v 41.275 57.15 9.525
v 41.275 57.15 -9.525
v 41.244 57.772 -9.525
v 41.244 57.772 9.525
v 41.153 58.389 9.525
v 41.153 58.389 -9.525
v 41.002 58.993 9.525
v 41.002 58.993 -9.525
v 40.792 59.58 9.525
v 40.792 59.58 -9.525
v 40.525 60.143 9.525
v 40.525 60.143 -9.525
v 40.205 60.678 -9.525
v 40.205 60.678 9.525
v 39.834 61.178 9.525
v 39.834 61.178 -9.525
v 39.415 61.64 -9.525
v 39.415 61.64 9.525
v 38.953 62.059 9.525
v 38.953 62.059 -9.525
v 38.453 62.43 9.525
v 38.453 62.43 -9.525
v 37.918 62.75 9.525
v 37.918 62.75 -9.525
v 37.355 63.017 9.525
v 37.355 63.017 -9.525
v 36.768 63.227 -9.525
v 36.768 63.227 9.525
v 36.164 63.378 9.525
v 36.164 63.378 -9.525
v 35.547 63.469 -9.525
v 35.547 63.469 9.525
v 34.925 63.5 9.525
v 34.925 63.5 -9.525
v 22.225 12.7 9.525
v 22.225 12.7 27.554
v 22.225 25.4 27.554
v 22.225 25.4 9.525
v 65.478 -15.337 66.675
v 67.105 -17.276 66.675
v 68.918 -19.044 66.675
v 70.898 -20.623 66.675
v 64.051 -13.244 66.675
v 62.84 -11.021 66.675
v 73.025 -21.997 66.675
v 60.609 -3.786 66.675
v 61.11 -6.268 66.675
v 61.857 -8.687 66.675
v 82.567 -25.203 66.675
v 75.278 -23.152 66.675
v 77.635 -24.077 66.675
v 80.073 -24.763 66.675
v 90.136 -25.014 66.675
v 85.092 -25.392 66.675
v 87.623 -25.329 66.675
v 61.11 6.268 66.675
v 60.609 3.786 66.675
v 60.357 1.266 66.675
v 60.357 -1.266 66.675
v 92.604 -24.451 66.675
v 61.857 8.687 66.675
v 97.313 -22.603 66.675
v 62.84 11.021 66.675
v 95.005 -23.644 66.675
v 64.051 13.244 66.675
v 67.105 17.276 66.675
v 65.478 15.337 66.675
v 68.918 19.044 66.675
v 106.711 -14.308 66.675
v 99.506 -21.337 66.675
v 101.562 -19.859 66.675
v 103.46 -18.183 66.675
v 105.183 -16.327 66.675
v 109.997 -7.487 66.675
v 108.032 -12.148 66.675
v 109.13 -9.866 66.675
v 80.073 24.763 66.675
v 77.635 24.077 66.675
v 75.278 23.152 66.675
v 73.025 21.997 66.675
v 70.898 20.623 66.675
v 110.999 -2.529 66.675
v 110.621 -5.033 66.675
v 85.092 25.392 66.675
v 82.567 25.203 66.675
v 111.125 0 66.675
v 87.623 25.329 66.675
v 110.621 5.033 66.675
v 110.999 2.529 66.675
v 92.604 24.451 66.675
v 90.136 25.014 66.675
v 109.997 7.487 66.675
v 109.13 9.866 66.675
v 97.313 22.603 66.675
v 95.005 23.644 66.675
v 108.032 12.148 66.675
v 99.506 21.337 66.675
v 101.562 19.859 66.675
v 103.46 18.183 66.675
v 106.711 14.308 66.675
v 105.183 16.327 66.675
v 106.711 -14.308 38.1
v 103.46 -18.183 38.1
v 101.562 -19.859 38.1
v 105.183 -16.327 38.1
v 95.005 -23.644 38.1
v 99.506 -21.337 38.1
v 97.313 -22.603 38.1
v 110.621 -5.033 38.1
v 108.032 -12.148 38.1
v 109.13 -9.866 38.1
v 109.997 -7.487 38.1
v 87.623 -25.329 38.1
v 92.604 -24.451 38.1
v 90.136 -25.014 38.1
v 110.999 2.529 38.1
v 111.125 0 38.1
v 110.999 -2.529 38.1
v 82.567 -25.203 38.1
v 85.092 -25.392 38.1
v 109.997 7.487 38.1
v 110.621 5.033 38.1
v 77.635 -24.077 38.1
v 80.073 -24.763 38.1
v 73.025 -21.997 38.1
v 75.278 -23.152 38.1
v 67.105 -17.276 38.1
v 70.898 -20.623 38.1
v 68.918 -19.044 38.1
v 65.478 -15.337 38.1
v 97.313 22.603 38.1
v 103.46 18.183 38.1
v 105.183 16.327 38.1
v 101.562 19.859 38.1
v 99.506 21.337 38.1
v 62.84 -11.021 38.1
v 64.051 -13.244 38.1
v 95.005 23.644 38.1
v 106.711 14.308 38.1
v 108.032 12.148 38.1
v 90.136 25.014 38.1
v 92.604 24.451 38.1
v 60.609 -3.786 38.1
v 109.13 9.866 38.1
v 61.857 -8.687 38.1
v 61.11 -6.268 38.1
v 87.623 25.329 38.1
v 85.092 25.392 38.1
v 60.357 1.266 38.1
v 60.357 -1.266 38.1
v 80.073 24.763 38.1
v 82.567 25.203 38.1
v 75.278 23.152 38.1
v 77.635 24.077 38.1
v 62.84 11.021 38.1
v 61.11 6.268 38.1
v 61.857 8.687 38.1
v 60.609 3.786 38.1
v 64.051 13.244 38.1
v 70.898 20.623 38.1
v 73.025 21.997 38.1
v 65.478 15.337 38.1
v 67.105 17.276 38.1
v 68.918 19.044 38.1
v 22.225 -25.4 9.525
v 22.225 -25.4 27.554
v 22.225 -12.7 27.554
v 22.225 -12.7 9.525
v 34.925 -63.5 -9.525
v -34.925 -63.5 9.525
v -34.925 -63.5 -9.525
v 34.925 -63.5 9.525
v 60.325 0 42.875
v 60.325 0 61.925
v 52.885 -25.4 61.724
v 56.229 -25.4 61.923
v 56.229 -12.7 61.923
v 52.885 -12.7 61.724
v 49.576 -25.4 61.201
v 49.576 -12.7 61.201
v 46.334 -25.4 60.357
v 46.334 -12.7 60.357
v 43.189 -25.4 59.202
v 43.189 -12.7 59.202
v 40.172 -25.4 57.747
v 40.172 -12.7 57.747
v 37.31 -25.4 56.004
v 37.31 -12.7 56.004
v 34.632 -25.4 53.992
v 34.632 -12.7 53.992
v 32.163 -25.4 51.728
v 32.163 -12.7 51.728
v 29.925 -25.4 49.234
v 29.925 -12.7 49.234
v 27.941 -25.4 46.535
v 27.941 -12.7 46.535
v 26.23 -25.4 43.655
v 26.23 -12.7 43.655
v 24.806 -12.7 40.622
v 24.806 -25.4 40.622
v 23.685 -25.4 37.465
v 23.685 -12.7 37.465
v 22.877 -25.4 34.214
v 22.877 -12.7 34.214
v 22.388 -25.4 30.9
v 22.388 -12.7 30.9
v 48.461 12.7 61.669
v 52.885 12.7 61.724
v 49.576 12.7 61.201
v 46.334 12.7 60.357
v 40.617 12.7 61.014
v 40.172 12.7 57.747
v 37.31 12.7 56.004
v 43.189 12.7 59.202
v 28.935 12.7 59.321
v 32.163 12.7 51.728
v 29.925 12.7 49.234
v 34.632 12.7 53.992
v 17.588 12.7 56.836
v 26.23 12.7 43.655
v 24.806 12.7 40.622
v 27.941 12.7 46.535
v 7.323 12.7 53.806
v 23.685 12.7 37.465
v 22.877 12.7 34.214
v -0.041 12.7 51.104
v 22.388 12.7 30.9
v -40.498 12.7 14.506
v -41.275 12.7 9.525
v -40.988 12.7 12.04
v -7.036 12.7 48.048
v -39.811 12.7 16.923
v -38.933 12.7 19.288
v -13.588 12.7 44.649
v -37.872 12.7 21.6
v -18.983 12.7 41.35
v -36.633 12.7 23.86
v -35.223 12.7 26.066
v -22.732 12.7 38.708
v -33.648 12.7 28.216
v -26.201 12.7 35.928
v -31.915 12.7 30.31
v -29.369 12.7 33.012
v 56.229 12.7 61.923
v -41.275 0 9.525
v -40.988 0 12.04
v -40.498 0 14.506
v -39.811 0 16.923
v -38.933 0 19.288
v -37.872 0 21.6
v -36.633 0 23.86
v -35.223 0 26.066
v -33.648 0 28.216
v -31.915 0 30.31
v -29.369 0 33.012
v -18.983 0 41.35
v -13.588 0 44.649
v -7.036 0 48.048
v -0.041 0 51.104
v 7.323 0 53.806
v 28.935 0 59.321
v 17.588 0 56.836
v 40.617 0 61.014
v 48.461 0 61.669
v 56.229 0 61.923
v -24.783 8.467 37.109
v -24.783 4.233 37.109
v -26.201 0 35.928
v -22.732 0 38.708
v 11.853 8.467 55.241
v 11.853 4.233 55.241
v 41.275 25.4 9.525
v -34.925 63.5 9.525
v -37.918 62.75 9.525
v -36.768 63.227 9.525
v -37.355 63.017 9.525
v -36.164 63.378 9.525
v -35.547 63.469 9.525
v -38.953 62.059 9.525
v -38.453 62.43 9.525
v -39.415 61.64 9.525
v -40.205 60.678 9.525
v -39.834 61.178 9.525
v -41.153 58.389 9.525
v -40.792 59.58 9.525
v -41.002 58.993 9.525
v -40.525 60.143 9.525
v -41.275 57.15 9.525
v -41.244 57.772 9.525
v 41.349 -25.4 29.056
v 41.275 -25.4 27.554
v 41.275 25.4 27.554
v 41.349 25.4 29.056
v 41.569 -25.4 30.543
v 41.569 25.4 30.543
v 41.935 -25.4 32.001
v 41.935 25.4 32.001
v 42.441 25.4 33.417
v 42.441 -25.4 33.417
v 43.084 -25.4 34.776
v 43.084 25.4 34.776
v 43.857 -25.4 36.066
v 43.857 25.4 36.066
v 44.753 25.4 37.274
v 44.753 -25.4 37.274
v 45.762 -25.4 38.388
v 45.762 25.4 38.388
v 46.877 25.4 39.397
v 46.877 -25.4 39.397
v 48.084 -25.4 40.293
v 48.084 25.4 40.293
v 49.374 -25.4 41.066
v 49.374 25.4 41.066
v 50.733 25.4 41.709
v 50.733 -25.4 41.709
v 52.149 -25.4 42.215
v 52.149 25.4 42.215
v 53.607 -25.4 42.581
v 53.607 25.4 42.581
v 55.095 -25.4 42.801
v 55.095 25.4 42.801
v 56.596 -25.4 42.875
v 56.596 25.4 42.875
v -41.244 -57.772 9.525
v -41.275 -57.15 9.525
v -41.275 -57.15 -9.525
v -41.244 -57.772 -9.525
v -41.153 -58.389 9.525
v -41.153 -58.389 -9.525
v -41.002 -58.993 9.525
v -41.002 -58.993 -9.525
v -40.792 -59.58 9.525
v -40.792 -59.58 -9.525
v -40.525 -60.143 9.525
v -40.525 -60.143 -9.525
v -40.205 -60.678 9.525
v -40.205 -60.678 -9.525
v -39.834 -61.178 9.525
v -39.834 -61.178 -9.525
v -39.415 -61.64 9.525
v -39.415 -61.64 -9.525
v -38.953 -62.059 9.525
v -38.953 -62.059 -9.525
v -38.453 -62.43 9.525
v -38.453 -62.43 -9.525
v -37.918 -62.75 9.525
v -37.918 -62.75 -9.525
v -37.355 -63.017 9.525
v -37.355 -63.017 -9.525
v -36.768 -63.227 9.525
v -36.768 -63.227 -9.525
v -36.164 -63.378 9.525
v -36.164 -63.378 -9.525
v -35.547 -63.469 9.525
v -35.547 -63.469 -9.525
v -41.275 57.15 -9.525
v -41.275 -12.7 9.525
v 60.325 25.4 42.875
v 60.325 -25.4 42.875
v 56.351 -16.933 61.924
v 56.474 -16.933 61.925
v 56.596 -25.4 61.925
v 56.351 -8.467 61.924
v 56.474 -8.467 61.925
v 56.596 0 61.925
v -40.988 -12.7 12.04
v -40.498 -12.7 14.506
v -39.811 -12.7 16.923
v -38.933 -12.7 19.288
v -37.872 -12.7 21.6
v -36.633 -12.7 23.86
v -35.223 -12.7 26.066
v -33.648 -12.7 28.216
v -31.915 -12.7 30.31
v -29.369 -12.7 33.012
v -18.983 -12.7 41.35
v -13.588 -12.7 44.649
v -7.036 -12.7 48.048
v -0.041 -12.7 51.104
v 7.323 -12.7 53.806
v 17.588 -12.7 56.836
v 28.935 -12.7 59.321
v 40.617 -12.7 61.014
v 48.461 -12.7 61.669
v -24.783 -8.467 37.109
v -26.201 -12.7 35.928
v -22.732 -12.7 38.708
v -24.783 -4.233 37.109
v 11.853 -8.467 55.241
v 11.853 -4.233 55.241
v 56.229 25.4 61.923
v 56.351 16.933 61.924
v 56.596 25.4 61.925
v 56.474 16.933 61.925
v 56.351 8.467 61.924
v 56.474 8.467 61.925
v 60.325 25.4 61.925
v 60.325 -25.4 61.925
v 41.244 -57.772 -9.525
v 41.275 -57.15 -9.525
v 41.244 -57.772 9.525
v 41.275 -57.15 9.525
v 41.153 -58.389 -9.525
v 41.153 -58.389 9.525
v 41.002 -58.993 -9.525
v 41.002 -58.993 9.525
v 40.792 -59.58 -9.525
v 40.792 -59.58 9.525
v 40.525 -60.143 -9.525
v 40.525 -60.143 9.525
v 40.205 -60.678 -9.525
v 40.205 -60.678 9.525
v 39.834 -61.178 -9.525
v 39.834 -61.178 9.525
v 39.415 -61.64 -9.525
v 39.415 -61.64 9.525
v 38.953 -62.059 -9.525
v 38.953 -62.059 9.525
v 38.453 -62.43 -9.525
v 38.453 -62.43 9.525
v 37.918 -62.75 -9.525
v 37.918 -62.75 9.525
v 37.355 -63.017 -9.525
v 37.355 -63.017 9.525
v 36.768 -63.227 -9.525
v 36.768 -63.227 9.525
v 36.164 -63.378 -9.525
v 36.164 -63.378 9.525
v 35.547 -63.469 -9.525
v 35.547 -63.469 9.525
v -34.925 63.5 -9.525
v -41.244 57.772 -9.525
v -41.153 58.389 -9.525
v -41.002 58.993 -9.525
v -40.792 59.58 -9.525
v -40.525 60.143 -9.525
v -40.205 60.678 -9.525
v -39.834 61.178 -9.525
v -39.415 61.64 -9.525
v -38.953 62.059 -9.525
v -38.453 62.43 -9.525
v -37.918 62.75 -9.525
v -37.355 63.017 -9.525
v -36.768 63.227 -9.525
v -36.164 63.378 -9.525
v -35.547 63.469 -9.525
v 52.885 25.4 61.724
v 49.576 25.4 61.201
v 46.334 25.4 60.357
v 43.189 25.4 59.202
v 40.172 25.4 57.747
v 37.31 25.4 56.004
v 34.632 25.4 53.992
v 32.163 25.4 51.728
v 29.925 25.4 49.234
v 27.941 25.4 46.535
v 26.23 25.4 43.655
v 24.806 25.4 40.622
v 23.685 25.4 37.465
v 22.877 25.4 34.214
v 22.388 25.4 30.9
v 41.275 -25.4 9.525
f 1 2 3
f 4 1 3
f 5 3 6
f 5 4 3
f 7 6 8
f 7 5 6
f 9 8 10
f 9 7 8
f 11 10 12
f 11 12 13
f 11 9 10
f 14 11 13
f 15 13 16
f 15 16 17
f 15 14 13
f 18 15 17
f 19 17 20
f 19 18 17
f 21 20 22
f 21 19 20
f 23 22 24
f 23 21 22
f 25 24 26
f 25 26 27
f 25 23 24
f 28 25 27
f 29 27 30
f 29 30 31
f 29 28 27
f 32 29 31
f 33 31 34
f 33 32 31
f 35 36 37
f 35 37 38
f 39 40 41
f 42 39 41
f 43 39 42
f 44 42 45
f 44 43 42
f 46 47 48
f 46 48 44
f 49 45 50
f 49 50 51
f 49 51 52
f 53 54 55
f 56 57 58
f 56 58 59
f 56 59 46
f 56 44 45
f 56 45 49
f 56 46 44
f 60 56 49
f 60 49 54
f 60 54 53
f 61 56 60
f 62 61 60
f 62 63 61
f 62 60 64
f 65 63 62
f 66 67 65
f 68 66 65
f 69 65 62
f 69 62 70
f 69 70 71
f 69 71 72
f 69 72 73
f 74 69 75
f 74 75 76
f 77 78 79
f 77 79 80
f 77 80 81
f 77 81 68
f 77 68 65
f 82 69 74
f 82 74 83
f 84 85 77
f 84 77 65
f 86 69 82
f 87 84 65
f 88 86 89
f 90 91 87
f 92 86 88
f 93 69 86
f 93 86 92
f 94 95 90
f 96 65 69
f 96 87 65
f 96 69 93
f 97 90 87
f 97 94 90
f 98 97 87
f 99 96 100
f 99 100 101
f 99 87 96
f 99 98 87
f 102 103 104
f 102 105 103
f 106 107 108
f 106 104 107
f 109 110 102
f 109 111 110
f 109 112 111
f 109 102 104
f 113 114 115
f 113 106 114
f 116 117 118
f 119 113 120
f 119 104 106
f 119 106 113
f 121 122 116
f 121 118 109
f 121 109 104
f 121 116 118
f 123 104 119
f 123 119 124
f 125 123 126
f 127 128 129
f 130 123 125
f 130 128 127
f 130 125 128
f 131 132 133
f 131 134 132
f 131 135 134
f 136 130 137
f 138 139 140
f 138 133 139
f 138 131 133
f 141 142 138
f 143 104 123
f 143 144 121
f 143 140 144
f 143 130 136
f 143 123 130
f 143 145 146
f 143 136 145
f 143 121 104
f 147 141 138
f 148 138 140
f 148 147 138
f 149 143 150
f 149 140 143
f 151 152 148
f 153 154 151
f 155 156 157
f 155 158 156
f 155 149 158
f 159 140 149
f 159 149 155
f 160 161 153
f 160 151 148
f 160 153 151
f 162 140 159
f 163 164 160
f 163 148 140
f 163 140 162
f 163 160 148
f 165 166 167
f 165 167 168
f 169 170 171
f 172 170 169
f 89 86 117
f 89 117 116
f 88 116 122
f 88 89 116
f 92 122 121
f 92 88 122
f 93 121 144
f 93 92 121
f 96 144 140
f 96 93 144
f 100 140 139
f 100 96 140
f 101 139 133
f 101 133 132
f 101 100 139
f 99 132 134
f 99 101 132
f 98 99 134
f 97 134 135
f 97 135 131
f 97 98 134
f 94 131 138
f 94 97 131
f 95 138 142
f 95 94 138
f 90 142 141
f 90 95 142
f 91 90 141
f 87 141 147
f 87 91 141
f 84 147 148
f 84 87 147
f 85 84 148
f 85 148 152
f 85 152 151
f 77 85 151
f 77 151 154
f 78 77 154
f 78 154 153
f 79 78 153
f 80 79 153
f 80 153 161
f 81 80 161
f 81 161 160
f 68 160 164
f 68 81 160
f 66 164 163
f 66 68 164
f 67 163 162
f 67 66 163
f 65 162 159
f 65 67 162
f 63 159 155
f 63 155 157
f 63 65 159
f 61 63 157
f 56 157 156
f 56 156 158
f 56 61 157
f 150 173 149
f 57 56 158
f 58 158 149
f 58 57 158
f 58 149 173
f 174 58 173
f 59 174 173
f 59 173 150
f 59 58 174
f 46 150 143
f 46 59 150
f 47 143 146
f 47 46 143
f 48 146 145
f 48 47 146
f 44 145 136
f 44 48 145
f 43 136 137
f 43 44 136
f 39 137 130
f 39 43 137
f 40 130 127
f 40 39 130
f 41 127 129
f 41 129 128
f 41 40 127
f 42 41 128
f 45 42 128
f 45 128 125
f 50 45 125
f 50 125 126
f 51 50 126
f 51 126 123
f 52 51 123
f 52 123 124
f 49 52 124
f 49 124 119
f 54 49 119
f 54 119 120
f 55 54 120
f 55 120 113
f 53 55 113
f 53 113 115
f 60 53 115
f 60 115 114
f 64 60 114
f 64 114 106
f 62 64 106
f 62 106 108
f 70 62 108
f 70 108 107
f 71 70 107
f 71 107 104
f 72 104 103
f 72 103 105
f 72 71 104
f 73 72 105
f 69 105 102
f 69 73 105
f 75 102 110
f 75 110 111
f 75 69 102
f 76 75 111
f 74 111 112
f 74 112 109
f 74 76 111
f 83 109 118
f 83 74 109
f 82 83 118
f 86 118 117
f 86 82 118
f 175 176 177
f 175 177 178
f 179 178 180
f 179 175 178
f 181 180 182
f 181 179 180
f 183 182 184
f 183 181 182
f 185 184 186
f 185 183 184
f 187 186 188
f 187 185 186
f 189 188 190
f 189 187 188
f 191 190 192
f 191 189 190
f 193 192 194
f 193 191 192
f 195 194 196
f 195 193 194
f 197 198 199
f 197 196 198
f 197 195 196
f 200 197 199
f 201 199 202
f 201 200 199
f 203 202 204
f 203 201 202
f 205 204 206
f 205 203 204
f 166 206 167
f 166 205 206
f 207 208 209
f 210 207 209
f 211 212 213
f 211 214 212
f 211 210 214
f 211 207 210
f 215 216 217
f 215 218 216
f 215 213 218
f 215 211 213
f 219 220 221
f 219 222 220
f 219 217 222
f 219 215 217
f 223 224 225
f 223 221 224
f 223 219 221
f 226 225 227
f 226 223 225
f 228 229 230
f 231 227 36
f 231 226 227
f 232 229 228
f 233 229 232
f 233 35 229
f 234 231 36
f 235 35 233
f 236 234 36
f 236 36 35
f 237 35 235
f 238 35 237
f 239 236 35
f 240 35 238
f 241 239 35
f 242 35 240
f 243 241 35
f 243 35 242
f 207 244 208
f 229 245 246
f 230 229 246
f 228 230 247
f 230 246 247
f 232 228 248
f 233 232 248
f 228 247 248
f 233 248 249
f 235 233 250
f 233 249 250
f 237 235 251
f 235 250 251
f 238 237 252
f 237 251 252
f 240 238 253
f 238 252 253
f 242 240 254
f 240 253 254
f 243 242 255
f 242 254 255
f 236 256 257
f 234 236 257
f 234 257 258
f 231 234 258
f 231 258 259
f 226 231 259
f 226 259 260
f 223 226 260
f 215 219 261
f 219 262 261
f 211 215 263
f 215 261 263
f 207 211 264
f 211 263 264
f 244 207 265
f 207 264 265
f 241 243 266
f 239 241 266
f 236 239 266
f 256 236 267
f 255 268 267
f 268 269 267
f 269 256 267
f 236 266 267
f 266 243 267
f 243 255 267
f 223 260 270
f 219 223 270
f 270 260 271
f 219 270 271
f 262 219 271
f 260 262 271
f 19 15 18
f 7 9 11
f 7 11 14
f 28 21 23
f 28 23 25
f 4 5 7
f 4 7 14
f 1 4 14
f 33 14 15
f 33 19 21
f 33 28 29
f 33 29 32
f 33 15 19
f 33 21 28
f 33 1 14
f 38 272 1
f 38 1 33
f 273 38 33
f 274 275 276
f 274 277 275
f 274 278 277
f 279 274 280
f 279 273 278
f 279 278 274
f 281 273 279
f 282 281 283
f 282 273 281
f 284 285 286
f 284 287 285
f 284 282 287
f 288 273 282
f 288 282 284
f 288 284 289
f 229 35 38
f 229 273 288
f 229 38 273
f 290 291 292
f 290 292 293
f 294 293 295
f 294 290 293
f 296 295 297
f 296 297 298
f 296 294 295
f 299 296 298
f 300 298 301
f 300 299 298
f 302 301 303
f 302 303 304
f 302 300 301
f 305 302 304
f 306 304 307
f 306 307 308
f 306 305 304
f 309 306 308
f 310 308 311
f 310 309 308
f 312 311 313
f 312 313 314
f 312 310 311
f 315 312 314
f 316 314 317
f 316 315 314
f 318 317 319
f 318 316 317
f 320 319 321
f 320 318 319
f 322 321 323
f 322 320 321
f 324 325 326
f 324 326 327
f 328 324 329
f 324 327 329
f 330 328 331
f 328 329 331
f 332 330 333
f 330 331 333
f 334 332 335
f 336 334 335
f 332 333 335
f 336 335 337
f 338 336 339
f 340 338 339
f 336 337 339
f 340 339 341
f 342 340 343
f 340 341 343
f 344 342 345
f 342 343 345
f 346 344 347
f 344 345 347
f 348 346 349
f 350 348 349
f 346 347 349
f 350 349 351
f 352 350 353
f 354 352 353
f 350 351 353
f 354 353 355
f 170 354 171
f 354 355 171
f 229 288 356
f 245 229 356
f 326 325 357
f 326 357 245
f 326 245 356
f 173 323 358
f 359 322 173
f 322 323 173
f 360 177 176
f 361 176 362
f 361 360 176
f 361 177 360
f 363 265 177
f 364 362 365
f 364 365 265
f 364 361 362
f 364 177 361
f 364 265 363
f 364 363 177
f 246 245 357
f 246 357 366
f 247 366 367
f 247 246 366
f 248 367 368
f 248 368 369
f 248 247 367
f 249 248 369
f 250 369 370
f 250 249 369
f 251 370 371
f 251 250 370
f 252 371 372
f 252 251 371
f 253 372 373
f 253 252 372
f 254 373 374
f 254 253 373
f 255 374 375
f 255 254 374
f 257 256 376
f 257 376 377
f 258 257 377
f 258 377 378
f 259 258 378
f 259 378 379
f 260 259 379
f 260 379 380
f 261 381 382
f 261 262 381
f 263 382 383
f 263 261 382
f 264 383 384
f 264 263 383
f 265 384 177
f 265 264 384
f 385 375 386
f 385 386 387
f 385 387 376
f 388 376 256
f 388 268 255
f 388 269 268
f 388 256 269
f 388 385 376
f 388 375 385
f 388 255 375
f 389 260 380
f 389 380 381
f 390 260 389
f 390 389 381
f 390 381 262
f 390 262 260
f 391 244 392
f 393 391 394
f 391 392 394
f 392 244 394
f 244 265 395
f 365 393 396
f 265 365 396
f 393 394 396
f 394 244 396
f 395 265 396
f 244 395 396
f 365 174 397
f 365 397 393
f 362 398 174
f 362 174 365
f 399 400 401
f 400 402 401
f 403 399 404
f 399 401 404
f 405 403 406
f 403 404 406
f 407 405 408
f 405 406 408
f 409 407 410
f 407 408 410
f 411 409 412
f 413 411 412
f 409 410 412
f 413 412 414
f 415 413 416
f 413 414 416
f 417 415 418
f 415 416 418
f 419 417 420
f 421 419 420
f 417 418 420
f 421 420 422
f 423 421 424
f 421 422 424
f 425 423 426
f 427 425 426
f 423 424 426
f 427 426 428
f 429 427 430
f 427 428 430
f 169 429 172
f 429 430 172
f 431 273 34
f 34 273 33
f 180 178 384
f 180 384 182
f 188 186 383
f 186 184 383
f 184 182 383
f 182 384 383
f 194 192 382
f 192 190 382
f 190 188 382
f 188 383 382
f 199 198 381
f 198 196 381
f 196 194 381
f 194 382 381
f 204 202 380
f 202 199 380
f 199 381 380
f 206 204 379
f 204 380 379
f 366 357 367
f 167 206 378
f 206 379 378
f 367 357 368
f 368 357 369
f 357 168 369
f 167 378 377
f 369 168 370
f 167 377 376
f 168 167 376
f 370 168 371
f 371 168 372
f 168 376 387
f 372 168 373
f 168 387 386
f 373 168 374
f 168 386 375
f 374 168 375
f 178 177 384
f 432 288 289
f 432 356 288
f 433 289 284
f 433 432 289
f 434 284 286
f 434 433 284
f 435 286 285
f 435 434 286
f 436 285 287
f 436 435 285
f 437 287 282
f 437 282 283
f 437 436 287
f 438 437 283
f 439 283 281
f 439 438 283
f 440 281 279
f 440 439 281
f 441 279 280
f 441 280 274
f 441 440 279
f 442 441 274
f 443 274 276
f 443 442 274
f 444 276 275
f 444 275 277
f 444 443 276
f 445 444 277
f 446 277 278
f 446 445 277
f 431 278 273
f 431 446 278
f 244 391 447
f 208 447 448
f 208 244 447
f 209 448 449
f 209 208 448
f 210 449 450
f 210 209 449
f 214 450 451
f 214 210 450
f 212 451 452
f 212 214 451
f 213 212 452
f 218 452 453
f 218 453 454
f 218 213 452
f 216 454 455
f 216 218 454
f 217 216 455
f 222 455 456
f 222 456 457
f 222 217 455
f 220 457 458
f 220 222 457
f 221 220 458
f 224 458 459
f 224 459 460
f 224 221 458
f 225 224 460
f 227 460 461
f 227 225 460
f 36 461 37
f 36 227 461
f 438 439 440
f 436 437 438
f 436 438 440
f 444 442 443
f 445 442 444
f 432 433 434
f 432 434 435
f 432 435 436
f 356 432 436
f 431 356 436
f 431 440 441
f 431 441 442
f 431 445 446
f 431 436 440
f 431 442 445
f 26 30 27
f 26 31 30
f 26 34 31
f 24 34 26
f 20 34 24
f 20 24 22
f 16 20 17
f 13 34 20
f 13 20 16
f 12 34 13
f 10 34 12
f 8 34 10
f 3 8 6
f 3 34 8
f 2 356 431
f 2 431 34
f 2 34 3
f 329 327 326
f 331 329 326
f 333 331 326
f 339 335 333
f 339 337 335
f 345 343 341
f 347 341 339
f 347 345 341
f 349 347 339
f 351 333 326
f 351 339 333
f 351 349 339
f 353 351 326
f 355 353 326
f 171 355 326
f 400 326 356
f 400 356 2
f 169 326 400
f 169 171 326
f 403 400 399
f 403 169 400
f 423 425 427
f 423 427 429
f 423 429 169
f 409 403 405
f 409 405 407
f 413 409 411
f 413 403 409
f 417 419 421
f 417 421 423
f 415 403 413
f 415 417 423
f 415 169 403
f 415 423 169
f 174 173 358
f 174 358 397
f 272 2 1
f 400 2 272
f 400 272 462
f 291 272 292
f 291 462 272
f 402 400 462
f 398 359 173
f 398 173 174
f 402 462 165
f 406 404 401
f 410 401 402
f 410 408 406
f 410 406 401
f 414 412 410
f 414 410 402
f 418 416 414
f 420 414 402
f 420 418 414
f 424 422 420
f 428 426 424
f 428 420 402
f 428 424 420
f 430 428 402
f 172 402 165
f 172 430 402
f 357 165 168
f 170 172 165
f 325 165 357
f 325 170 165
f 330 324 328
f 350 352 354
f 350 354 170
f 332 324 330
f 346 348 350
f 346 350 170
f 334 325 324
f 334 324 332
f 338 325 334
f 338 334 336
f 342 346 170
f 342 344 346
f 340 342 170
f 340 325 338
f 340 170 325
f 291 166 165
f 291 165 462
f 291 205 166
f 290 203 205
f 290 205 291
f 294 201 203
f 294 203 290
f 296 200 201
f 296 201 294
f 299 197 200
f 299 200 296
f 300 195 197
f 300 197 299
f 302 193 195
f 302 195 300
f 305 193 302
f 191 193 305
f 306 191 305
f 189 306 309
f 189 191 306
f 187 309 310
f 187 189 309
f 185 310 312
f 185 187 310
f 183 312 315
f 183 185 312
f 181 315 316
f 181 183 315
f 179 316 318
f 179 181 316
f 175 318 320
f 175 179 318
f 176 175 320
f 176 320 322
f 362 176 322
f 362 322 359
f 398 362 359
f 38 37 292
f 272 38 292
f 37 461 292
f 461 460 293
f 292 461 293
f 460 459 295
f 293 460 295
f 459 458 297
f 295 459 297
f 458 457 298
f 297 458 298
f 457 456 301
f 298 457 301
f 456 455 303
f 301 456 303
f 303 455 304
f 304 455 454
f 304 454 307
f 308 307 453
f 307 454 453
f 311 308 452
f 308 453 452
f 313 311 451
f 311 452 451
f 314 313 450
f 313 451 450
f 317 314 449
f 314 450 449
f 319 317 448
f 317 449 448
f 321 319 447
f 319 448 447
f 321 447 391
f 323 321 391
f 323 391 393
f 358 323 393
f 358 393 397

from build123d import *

# Parameters (mm, degrees)
F1_DEPTH = 63.5
F2_DEPTH = 25.4
F3_DEPTH = 12.7
F5_R     = 6.35


with BuildPart() as f1:
    # F0 (on Front) → F1 (new body, symmetric)
    with BuildSketch(Plane.XZ):
        Polygon((22.225, 9.525), (-41.275, 9.525), (-41.275, -9.525), (41.275, -9.525), (41.275, 9.525), align=None)
    extrude(amount=F1_DEPTH, both=True)

    # F0 (on Front) → F2 (join, symmetric)
    with BuildSketch(Plane.XZ):
        with BuildLine():
            Line((22.225, 27.55392), (22.225, 9.525))
            Line((22.225, 9.525), (41.275, 9.525))
            Line((41.275, 9.525), (41.275, 27.55392))
            ThreePointArc((41.275, 27.55392), (45.762499, 38.387701), (56.59628, 42.8752))
            Line((56.59628, 42.8752), (60.325, 42.8752))
            Line((60.325, 42.8752), (60.325, 61.9252))
            Line((60.325, 61.9252), (56.59628, 61.9252))
            add(Edge.make_bspline(
                [(56.229045, 61.923238), (56.351511, 61.924048), (56.473923, 61.924702), (56.59628, 61.9252)],
                knots=[110.70871, 110.70871, 110.70871, 110.70871, 111.016073, 111.016073, 111.016073, 111.016073], degree=3))
            ThreePointArc((56.229045, 61.923238), (32.162623, 51.727899), (22.225, 27.55392))
        make_face()
    extrude(amount=F2_DEPTH, both=True)

    # F0 (on Front) → F3 (join, symmetric)
    with BuildSketch(Plane.XZ):
        with BuildLine():
            add(Edge.make_bspline(
                [(-41.275, 9.525), (-38.990143, 41.170035), (12.118228, 61.631667), (56.229045, 61.923238)],
                knots=[0, 0, 0, 0, 110.70871, 110.70871, 110.70871, 110.70871], degree=3))
            Line((-41.275, 9.525), (22.225, 9.525))
            Line((22.225, 9.525), (22.225, 27.55392))
            ThreePointArc((22.225, 27.55392), (32.162623, 51.727899), (56.229045, 61.923238))
        make_face()
    extrude(amount=F3_DEPTH, both=True)

    # F0 (on Front) → F4 (revolve)
    with BuildSketch(Plane.XZ):
        Polygon((85.725, 66.675), (85.725, 61.9252), (85.725, 42.8752), (85.725, 38.1), (111.125, 38.1), (111.125, 66.675), align=None)
    revolve(axis=Axis((85.725, 0, 52.3875), (0, 0, 1)))

    # F5
    f5_edges = [f1.edges().sort_by_distance(p)[0] for p in [
        (41.275, -63.5, 0),
        (-41.275, -63.5, 0),
        (41.275, 63.5, 0),
        (-41.275, 63.5, 0),
    ]]
    fillet(f5_edges, radius=F5_R)


solid = f1.part
